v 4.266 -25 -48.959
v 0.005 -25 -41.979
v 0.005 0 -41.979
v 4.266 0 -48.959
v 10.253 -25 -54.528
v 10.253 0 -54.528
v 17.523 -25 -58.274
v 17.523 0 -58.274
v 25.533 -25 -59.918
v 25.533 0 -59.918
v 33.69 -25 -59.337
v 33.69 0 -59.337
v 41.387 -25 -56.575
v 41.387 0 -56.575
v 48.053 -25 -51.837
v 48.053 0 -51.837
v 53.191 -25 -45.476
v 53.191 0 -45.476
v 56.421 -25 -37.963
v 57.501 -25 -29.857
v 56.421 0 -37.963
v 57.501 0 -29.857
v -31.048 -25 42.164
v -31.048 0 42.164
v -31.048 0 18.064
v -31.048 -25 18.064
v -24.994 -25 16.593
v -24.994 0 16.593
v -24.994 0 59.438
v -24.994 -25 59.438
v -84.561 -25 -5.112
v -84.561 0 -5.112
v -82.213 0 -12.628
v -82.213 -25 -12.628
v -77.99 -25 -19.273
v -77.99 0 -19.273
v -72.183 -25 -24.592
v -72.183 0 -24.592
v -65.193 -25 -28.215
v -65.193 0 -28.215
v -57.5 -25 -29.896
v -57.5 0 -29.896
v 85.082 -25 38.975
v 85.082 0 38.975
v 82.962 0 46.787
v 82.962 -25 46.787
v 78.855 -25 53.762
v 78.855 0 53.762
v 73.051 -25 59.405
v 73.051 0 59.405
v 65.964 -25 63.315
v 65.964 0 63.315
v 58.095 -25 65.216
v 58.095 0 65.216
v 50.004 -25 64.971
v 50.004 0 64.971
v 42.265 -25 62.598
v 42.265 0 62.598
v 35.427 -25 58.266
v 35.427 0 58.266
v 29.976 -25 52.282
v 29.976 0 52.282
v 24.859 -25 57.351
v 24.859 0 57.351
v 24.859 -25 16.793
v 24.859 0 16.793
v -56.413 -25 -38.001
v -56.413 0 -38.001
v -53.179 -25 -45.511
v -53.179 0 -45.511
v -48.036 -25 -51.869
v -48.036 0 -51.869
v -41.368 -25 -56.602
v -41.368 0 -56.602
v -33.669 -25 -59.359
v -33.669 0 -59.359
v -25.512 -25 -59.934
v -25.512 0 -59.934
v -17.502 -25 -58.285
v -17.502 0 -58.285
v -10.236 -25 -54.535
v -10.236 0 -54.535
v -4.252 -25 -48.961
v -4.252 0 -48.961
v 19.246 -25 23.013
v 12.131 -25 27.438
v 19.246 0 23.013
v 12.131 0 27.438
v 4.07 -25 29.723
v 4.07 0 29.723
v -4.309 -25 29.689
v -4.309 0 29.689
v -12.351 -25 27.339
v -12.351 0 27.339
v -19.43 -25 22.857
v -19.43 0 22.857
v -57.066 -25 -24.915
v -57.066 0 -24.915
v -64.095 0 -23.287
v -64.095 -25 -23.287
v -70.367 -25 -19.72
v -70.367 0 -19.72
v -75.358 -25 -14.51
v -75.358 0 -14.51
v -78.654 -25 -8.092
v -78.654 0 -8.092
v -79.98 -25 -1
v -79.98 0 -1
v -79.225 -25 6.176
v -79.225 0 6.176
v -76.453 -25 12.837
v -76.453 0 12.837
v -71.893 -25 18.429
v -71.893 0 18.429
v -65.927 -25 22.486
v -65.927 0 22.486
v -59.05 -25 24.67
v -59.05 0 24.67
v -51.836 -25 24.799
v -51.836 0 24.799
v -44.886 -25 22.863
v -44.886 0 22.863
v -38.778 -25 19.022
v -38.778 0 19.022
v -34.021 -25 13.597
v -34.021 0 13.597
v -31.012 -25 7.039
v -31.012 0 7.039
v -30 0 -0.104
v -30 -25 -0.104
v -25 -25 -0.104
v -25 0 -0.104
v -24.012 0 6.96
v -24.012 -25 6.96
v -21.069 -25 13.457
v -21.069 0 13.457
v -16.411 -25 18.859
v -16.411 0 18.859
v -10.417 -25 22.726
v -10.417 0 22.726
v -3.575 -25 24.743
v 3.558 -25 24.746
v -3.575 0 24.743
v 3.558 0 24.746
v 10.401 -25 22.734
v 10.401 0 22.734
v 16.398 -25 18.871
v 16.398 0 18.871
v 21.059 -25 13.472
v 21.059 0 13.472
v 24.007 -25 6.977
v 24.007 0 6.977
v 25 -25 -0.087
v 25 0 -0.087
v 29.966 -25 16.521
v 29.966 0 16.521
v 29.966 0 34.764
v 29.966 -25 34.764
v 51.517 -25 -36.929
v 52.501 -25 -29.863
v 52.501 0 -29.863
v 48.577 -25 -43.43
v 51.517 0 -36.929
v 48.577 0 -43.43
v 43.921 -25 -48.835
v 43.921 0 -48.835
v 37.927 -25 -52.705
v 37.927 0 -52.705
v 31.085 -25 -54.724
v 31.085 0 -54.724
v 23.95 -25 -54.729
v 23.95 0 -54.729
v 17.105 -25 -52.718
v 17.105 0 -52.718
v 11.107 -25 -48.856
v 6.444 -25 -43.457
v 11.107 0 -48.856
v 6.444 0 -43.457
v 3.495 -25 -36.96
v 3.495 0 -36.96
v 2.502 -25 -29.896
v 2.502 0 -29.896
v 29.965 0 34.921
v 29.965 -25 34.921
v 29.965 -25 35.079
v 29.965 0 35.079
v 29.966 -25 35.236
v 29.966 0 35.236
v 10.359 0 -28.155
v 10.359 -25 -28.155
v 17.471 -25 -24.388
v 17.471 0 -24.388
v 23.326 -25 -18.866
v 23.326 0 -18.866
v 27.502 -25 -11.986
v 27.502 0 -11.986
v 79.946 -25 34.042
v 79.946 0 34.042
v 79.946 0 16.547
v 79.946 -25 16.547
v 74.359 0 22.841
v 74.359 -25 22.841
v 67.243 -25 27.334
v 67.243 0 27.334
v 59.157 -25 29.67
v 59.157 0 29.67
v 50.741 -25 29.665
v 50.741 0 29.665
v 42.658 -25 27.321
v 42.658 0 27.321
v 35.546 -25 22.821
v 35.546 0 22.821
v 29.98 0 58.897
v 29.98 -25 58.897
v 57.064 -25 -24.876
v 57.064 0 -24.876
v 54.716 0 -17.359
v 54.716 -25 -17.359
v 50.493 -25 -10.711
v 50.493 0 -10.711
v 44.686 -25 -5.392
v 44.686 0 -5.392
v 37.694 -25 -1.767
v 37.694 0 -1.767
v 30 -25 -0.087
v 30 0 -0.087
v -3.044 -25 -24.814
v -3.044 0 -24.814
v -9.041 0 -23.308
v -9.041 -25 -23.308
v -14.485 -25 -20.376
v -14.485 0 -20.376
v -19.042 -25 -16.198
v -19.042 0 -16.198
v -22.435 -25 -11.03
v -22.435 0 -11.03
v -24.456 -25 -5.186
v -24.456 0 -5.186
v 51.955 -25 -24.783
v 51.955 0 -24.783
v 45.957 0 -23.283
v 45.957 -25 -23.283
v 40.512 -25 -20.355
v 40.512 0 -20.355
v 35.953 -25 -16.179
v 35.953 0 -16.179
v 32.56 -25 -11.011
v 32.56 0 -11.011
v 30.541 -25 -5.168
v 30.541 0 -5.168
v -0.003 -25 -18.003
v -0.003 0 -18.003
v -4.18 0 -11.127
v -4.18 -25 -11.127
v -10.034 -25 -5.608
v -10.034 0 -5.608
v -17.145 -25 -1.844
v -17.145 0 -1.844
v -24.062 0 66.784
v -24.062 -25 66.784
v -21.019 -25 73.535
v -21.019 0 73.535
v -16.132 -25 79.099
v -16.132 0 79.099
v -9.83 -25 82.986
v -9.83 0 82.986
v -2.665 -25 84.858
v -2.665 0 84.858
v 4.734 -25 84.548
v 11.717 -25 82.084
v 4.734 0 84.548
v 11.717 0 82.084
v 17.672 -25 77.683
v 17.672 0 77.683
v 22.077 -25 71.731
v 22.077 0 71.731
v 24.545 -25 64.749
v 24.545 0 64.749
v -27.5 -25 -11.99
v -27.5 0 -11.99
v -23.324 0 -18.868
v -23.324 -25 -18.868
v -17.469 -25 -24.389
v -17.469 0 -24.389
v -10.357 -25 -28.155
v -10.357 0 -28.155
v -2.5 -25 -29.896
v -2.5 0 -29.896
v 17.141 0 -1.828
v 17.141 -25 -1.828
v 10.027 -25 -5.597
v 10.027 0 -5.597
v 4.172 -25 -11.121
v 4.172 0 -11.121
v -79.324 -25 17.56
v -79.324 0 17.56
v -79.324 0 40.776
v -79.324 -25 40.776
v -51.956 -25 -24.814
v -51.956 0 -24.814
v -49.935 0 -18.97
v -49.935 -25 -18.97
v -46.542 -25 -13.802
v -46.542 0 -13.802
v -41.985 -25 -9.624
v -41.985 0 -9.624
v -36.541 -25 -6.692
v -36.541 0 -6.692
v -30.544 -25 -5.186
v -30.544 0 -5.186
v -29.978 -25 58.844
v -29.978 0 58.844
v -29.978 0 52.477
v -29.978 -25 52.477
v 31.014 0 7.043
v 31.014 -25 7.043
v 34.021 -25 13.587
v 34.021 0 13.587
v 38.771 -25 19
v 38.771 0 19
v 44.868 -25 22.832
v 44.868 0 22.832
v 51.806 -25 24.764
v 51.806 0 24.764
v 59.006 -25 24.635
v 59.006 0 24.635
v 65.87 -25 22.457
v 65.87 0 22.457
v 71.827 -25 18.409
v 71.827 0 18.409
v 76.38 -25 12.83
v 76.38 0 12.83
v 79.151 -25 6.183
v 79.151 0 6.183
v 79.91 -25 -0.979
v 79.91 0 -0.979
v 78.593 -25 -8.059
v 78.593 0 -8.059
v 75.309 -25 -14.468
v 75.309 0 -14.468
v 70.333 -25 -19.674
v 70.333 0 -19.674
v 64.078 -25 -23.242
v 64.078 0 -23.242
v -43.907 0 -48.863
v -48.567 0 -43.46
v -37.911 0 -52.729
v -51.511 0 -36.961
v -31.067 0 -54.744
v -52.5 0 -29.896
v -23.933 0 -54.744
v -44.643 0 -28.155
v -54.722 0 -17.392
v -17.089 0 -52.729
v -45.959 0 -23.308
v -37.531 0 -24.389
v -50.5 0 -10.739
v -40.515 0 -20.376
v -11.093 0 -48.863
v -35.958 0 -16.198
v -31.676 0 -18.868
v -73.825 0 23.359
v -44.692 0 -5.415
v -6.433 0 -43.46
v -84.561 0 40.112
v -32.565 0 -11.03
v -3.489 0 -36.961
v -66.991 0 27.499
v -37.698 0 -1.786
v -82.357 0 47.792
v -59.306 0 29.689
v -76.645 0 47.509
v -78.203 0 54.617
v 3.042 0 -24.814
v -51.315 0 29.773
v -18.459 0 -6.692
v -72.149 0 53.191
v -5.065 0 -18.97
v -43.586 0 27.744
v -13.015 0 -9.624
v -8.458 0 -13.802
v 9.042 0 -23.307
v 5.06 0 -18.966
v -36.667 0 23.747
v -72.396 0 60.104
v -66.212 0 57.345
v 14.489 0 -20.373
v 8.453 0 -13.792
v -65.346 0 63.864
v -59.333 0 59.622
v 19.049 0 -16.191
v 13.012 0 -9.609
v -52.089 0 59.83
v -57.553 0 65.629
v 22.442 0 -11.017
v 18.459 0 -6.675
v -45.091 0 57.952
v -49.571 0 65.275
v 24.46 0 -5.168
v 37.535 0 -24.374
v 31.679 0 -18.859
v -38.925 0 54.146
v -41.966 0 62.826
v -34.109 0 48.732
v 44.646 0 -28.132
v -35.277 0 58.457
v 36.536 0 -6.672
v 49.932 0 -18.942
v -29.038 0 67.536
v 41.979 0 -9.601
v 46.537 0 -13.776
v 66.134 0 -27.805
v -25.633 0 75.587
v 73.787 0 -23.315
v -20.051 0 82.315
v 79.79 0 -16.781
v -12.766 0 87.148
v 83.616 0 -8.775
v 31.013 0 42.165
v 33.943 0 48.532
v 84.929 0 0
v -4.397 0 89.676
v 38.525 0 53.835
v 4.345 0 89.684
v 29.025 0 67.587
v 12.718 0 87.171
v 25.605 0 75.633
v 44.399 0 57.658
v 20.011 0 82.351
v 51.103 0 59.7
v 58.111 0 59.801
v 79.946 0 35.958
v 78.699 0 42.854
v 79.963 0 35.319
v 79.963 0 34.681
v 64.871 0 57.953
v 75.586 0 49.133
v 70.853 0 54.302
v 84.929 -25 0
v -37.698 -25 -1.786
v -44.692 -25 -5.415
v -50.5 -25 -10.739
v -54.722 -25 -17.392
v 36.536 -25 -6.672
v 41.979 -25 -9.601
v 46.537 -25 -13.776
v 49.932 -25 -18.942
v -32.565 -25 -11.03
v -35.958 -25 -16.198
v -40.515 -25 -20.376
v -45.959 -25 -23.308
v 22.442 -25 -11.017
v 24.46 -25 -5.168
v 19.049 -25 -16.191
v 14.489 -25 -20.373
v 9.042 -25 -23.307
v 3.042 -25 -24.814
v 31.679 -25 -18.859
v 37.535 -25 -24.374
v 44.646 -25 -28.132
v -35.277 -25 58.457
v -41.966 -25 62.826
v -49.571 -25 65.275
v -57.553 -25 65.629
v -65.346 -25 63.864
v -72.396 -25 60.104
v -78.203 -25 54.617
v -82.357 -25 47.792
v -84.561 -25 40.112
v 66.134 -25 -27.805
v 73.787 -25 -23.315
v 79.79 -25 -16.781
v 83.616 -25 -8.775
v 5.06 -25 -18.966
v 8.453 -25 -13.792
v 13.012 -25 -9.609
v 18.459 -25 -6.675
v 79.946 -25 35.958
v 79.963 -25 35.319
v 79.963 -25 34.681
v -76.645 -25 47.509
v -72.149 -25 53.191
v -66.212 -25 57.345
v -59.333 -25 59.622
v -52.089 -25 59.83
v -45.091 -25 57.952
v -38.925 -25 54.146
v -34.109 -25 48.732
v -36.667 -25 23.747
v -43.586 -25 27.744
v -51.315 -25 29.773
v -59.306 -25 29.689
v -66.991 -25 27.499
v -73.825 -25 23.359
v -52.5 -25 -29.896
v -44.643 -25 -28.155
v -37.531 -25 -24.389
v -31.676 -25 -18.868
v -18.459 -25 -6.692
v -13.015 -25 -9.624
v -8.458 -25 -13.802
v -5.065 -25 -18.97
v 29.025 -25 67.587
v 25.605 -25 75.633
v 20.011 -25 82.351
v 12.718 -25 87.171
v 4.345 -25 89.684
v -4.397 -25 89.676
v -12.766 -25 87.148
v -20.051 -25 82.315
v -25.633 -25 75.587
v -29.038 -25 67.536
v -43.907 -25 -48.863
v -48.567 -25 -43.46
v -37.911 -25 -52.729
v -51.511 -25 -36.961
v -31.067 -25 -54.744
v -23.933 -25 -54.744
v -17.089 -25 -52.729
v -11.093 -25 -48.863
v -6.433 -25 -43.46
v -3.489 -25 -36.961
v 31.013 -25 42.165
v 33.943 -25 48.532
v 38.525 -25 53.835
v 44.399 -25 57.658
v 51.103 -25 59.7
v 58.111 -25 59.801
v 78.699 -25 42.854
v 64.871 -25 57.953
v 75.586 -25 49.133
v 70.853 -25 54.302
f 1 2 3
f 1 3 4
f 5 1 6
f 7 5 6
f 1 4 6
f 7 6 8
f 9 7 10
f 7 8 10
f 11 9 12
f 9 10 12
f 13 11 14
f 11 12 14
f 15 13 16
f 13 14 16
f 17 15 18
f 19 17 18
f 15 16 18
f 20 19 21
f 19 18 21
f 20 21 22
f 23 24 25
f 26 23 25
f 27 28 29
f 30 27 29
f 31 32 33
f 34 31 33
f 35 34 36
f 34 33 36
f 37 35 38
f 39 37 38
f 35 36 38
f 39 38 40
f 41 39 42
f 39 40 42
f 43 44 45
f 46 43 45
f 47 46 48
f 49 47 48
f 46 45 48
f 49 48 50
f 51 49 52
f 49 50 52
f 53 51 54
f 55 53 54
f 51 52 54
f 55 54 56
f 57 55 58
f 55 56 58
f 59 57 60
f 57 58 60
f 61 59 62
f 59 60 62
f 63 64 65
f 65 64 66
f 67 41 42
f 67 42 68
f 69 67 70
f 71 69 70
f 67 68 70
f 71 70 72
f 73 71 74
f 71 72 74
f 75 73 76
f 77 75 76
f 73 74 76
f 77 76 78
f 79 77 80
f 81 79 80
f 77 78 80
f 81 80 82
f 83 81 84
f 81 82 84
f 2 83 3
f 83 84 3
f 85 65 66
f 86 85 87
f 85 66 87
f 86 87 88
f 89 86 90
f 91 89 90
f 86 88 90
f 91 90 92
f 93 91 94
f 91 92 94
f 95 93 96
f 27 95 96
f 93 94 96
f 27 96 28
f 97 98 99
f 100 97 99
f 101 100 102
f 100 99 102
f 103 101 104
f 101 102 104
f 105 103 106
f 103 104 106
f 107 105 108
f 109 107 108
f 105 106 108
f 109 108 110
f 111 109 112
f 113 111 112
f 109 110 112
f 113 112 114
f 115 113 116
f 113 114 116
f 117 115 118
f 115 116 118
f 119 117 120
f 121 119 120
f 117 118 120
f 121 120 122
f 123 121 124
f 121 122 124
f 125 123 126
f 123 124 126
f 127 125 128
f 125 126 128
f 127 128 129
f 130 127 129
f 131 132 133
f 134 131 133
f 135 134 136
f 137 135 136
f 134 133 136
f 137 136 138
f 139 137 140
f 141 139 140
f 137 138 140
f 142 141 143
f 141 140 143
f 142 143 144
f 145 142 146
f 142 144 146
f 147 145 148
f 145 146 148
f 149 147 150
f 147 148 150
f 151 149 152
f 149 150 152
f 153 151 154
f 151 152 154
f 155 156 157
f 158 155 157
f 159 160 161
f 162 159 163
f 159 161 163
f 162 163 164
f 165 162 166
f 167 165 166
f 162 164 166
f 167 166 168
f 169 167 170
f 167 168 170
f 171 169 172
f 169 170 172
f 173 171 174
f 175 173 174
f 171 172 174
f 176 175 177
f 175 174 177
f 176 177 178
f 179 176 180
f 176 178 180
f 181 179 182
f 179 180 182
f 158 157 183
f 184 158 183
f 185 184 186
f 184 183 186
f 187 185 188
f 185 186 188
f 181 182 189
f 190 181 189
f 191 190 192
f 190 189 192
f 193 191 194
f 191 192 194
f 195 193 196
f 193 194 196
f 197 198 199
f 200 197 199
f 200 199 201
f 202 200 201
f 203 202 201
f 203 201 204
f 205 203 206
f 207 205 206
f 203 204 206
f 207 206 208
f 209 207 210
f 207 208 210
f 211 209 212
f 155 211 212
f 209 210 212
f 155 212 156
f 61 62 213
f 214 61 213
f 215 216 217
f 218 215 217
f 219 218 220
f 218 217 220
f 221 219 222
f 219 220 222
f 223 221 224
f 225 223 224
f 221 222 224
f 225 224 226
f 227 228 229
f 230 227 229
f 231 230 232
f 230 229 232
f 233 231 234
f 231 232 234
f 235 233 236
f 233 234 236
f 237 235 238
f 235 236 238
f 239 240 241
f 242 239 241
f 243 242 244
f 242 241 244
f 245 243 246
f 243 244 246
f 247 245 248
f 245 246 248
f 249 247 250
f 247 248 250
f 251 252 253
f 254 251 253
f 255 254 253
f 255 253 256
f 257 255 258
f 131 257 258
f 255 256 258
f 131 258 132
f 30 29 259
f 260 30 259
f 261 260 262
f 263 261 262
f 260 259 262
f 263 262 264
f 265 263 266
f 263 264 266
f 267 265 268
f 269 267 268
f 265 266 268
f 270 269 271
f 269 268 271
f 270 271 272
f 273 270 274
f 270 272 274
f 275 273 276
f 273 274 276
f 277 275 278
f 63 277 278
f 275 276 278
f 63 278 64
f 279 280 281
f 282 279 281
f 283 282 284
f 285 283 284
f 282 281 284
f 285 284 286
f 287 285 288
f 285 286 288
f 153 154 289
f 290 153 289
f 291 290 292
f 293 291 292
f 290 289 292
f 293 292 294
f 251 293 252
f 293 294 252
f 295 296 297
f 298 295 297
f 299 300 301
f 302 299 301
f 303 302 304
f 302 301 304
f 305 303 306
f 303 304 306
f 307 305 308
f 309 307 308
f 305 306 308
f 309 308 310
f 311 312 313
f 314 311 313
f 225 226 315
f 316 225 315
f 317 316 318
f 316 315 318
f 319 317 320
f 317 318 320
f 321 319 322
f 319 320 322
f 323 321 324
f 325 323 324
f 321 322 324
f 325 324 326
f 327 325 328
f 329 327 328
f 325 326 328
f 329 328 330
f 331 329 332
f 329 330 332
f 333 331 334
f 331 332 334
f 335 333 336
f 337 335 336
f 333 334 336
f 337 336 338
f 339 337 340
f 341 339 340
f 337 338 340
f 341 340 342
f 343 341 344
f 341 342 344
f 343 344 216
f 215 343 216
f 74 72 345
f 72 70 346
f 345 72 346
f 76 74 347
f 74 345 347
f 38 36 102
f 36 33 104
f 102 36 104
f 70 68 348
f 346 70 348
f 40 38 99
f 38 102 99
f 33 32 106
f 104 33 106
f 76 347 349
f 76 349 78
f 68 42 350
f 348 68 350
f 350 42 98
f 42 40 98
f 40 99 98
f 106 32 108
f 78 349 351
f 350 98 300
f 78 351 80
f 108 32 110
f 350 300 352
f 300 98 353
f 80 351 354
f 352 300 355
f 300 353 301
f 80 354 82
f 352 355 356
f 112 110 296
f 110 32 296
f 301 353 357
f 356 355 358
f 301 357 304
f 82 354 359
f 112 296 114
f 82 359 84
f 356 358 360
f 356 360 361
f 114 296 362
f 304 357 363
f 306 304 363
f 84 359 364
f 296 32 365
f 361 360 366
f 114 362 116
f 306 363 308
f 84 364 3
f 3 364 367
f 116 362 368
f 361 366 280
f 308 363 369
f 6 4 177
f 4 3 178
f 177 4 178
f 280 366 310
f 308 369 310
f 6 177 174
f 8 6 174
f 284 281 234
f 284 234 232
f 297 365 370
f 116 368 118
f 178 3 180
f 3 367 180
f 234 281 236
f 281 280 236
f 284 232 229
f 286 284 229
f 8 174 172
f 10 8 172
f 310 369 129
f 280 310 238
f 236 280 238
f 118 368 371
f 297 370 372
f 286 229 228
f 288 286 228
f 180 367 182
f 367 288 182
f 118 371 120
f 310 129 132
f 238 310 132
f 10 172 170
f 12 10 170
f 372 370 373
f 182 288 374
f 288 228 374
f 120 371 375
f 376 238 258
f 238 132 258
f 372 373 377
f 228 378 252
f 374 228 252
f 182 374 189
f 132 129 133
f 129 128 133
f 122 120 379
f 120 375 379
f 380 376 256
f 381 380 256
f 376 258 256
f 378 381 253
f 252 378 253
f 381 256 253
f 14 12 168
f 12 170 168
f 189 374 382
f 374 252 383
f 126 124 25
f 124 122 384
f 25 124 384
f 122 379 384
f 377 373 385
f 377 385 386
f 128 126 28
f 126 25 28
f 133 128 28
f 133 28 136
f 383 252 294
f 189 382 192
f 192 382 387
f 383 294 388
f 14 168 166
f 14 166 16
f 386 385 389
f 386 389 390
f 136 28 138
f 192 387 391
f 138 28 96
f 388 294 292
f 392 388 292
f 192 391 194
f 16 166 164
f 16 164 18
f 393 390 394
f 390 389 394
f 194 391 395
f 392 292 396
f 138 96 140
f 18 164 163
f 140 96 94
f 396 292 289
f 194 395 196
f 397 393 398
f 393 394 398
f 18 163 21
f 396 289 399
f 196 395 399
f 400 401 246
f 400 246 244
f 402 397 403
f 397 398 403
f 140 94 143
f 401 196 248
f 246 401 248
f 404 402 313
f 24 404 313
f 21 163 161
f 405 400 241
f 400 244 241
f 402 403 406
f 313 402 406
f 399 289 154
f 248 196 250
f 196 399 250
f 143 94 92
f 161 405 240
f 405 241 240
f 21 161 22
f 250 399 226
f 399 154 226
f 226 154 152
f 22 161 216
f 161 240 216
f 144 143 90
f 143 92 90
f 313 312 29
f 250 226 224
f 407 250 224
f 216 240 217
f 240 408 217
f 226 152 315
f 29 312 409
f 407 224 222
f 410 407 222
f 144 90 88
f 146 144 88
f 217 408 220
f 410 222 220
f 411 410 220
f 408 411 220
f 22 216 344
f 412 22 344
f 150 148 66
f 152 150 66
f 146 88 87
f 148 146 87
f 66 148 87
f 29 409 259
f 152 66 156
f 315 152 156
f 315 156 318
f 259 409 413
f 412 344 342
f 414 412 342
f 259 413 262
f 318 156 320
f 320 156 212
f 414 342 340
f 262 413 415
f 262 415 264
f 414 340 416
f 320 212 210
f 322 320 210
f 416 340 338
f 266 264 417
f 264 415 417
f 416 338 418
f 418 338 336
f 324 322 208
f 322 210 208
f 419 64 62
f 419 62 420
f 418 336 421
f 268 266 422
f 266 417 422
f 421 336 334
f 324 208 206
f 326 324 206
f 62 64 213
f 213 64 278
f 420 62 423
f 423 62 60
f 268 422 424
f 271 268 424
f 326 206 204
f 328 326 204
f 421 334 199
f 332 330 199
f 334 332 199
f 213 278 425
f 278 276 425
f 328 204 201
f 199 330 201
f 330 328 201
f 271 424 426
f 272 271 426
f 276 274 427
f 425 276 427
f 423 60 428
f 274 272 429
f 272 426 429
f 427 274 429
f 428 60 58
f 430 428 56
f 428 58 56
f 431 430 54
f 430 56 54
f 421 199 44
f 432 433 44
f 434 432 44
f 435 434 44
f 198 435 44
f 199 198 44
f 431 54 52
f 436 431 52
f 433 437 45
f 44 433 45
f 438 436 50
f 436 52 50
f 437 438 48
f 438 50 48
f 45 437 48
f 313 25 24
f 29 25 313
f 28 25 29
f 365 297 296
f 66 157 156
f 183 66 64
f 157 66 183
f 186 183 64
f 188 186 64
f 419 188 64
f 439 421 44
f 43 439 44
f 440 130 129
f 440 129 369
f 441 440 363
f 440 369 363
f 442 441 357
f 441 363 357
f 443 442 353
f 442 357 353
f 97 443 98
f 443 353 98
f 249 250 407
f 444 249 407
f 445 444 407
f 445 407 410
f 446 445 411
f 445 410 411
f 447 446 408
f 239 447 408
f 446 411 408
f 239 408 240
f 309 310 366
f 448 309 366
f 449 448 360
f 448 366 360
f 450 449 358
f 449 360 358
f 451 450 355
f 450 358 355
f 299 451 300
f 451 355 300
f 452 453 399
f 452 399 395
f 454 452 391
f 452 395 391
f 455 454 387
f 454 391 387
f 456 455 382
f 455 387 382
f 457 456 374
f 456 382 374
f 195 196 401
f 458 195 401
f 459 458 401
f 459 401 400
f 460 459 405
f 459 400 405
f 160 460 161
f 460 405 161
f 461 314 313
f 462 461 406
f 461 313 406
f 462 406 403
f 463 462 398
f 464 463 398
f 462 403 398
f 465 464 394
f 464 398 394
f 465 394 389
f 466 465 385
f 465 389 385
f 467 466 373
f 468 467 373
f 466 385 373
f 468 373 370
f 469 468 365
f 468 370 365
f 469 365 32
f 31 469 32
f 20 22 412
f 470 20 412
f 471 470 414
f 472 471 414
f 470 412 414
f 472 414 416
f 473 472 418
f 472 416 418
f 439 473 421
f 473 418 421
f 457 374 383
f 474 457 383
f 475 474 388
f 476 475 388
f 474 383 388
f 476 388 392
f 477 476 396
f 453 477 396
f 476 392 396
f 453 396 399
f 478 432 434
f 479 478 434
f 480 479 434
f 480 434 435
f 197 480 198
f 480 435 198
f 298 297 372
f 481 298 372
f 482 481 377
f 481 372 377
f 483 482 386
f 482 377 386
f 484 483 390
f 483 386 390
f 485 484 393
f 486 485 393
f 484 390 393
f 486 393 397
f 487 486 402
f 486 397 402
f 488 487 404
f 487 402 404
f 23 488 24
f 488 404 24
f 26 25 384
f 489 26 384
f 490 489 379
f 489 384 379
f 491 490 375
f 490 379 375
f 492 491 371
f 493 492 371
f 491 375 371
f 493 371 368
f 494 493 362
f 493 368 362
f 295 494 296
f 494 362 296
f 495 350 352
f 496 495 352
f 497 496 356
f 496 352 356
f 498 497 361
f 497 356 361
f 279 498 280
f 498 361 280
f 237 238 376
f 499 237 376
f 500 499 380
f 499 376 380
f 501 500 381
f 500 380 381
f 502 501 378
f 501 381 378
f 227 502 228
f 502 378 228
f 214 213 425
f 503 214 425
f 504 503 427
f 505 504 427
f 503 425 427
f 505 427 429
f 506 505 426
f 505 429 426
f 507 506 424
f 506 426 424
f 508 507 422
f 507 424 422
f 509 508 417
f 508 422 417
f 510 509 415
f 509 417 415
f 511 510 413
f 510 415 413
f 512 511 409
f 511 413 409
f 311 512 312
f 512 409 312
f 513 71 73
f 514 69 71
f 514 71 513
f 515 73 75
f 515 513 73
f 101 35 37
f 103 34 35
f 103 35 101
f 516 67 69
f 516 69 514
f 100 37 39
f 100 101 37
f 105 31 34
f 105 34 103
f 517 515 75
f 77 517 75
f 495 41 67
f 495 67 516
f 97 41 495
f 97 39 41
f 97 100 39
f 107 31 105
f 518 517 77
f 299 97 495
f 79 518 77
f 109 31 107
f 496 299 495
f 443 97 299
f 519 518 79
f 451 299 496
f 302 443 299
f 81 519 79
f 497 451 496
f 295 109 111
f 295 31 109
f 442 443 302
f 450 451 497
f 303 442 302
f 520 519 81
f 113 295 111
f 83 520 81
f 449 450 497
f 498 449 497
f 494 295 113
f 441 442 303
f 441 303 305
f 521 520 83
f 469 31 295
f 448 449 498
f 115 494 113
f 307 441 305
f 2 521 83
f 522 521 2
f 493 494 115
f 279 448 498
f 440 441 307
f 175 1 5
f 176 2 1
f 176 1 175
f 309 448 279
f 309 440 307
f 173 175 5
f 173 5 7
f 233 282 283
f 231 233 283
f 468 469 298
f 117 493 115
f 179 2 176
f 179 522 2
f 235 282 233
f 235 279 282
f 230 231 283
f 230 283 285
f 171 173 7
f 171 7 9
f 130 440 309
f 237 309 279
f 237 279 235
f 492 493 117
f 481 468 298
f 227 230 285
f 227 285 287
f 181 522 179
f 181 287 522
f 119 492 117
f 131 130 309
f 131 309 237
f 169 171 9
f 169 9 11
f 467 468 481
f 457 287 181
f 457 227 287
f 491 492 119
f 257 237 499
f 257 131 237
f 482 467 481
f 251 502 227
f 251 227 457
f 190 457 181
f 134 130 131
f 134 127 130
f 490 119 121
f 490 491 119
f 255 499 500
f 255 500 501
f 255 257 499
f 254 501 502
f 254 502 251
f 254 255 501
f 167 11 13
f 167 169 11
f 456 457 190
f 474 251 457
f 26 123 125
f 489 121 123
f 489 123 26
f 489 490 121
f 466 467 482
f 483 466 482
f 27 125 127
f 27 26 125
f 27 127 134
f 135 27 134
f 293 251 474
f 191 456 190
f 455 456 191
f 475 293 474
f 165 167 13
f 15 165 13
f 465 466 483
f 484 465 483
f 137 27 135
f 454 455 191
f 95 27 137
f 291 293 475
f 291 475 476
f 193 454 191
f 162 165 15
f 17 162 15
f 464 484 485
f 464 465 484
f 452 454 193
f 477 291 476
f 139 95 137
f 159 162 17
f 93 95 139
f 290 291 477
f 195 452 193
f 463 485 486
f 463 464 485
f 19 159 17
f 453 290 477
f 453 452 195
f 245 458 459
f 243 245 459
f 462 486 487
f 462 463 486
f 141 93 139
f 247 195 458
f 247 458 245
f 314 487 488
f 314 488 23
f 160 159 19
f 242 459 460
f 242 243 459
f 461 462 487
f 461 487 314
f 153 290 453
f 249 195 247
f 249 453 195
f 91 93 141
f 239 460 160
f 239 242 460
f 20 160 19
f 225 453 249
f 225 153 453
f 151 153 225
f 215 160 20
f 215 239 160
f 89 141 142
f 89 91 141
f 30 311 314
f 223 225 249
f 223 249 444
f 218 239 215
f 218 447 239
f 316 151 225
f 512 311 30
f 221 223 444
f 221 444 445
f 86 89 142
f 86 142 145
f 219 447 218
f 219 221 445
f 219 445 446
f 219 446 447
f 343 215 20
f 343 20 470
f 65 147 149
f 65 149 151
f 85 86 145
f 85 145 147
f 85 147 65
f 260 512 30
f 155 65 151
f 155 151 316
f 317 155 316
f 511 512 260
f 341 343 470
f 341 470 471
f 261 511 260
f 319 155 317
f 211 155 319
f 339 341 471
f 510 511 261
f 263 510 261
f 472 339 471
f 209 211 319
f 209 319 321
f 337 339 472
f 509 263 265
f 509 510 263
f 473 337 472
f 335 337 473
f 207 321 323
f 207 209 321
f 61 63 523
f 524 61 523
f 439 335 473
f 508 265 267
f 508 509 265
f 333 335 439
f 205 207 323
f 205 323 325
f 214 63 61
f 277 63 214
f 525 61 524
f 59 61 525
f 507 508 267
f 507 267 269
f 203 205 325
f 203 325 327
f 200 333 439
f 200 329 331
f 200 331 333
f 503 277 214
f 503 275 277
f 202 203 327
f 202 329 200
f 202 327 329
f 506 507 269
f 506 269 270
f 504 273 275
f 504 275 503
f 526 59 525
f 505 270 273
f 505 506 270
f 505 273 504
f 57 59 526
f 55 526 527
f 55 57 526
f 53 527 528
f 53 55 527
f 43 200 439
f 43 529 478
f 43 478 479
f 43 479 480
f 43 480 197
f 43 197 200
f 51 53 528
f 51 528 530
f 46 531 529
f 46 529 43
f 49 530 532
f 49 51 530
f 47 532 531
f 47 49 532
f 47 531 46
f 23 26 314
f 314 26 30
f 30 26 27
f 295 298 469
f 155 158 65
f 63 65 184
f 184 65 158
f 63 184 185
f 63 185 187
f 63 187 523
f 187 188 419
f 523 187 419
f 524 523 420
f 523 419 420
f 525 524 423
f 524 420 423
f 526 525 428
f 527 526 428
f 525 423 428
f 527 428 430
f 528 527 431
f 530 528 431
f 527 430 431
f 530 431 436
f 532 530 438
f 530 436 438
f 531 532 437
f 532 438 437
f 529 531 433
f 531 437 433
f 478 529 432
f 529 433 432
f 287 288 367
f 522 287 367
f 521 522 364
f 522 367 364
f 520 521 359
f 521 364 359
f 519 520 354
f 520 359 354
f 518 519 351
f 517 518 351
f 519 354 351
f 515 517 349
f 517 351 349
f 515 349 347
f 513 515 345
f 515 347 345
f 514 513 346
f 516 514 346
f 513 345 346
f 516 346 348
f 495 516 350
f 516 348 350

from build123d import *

# Parameters (mm, degrees)
F1_DEPTH = 25


with BuildPart() as f1:
    # F0 (on Front) → F1 (new body)
    with BuildSketch(Plane.XZ):
        with BuildLine():
            ThreePointArc((-29.977737, 52.477247), (-61.508504, 65.006824), (-84.561244, 40.112031))
            Line((-84.561244, 40.112031), (-84.561244, -5.112031))
            ThreePointArc((-84.561244, -5.112031), (-75.261665, -22.123854), (-57.499819, -29.895667))
            ThreePointArc((-57.499819, -29.895667), (-33.669065, -59.35886), (0.004668, -41.978865))
            ThreePointArc((0.004668, -41.978865), (33.690375, -59.336998), (57.501353, -29.857023))
            ThreePointArc((57.501353, -29.857023), (77.031456, -20.271453), (84.929231, 3.5e-05))
            Line((84.929231, 3.5e-05), (85.082121, 38.974539))
            ThreePointArc((85.082121, 38.974539), (62.093064, 64.528697), (29.975545, 52.282199))
            Line((29.975545, 52.282199), (29.97973, 58.897384))
            ThreePointArc((29.97973, 58.897384), (-0.026483, 89.999988), (-29.977737, 58.844456))
            Line((-29.977737, 58.844456), (-29.977737, 52.477247))
        make_face()
        with BuildLine():
            ThreePointArc((-52.499782, -29.895634), (-37.531172, -24.389343), (-27.5, -11.989579))
            ThreePointArc((-27.5, -11.989579), (-17.468828, -24.389343), (-2.500218, -29.895634))
            ThreePointArc((-2.500218, -29.895634), (-27.5, -55), (-52.499782, -29.895634))
        make_face(mode=Mode.SUBTRACT)
        with BuildLine():
            ThreePointArc((-57.06582, -24.914502), (-71.893116, 18.428854), (-30.000218, -0.104366))
            ThreePointArc((-30.000218, -0.104366), (-47.771739, -7.885376), (-57.06582, -24.914502))
        make_face(mode=Mode.SUBTRACT)
        with BuildLine():
            ThreePointArc((-51.956196, -24.814013), (-44.393116, -11.571146), (-30.543804, -5.185987))
            ThreePointArc((-30.543804, -5.185987), (-38.106884, -18.428854), (-51.956196, -24.814013))
        make_face(mode=Mode.SUBTRACT)
        with BuildLine():
            ThreePointArc((-3.043804, -24.814013), (-16.893116, -18.428854), (-24.456196, -5.185987))
            ThreePointArc((-24.456196, -5.185987), (-10.606884, -11.571146), (-3.043804, -24.814013))
        make_face(mode=Mode.SUBTRACT)
        with BuildLine():
            ThreePointArc((-24.999782, -0.104366), (-0.008793, 24.999998), (24.999849, -0.08678))
            ThreePointArc((24.999849, -0.08678), (10.027405, -5.596797), (-0.003054, -18.003419))
            ThreePointArc((-0.003054, -18.003419), (-10.034277, -5.608433), (-24.999782, -0.104366))
        make_face(mode=Mode.SUBTRACT)
        with BuildLine():
            ThreePointArc((2.501765, -29.895504), (17.471102, -24.387714), (27.501614, -11.985875))
            ThreePointArc((27.501614, -11.985875), (37.534897, -24.373797), (52.501331, -29.863173))
            ThreePointArc((52.501331, -29.863173), (27.51778, -54.982279), (2.501765, -29.895504))
        make_face(mode=Mode.SUBTRACT)
        with BuildLine():
            ThreePointArc((3.041611, -24.814282), (10.602538, -11.558896), (24.460003, -5.168002))
            ThreePointArc((24.460003, -5.168002), (16.899076, -18.423388), (3.041611, -24.814282))
        make_face(mode=Mode.SUBTRACT)
        with BuildLine():
            ThreePointArc((51.954881, -24.782502), (38.102344, -18.409101), (30.540719, -5.167695))
            ThreePointArc((30.540719, -5.167695), (44.387786, -11.547068), (51.954881, -24.782502))
        make_face(mode=Mode.SUBTRACT)
        with BuildLine():
            ThreePointArc((30.00015, -0.08651), (71.826887, 18.409146), (57.063881, -24.876173))
            ThreePointArc((57.063881, -24.876173), (47.76502, -7.860024), (30.00015, -0.08651))
        make_face(mode=Mode.SUBTRACT)
        with BuildLine():
            Line((-31.048497, 42.16418), (-31.048497, 18.064481))
            ThreePointArc((-31.048497, 18.064481), (-55.31332, 29.998364), (-79.323589, 17.560269))
            Line((-79.323589, 17.560269), (-79.323589, 40.776075))
            ThreePointArc((-79.323589, 40.776075), (-55.718555, 59.989671), (-31.048497, 42.16418))
        make_face(mode=Mode.SUBTRACT)
        with BuildLine():
            Line((24.859272, 57.35111), (24.859272, 16.79335))
            ThreePointArc((24.859272, 16.79335), (-0.120786, 29.999757), (-24.993691, 16.592631))
            Line((-24.993691, 16.592631), (-24.993691, 59.438392))
            ThreePointArc((-24.993691, 59.438392), (1.045803, 84.978116), (24.859272, 57.35111))
        make_face(mode=Mode.SUBTRACT)
        with BuildLine():
            ThreePointArc((29.965727, 34.764301), (29.964616, 35.000022), (29.965727, 35.235743))
            ThreePointArc((29.965727, 35.235743), (54.603474, 59.997414), (79.946261, 35.95782))
            ThreePointArc((79.946261, 35.95782), (79.964616, 35.000022), (79.946261, 34.042225))
            Line((79.946261, 34.042225), (79.946261, 16.546791))
            ThreePointArc((79.946261, 16.546791), (54.948991, 29.964634), (29.965727, 16.520729))
            Line((29.965727, 16.520729), (29.965727, 34.764301))
        make_face(mode=Mode.SUBTRACT)
    extrude(amount=F1_DEPTH)


solid = f1.part
